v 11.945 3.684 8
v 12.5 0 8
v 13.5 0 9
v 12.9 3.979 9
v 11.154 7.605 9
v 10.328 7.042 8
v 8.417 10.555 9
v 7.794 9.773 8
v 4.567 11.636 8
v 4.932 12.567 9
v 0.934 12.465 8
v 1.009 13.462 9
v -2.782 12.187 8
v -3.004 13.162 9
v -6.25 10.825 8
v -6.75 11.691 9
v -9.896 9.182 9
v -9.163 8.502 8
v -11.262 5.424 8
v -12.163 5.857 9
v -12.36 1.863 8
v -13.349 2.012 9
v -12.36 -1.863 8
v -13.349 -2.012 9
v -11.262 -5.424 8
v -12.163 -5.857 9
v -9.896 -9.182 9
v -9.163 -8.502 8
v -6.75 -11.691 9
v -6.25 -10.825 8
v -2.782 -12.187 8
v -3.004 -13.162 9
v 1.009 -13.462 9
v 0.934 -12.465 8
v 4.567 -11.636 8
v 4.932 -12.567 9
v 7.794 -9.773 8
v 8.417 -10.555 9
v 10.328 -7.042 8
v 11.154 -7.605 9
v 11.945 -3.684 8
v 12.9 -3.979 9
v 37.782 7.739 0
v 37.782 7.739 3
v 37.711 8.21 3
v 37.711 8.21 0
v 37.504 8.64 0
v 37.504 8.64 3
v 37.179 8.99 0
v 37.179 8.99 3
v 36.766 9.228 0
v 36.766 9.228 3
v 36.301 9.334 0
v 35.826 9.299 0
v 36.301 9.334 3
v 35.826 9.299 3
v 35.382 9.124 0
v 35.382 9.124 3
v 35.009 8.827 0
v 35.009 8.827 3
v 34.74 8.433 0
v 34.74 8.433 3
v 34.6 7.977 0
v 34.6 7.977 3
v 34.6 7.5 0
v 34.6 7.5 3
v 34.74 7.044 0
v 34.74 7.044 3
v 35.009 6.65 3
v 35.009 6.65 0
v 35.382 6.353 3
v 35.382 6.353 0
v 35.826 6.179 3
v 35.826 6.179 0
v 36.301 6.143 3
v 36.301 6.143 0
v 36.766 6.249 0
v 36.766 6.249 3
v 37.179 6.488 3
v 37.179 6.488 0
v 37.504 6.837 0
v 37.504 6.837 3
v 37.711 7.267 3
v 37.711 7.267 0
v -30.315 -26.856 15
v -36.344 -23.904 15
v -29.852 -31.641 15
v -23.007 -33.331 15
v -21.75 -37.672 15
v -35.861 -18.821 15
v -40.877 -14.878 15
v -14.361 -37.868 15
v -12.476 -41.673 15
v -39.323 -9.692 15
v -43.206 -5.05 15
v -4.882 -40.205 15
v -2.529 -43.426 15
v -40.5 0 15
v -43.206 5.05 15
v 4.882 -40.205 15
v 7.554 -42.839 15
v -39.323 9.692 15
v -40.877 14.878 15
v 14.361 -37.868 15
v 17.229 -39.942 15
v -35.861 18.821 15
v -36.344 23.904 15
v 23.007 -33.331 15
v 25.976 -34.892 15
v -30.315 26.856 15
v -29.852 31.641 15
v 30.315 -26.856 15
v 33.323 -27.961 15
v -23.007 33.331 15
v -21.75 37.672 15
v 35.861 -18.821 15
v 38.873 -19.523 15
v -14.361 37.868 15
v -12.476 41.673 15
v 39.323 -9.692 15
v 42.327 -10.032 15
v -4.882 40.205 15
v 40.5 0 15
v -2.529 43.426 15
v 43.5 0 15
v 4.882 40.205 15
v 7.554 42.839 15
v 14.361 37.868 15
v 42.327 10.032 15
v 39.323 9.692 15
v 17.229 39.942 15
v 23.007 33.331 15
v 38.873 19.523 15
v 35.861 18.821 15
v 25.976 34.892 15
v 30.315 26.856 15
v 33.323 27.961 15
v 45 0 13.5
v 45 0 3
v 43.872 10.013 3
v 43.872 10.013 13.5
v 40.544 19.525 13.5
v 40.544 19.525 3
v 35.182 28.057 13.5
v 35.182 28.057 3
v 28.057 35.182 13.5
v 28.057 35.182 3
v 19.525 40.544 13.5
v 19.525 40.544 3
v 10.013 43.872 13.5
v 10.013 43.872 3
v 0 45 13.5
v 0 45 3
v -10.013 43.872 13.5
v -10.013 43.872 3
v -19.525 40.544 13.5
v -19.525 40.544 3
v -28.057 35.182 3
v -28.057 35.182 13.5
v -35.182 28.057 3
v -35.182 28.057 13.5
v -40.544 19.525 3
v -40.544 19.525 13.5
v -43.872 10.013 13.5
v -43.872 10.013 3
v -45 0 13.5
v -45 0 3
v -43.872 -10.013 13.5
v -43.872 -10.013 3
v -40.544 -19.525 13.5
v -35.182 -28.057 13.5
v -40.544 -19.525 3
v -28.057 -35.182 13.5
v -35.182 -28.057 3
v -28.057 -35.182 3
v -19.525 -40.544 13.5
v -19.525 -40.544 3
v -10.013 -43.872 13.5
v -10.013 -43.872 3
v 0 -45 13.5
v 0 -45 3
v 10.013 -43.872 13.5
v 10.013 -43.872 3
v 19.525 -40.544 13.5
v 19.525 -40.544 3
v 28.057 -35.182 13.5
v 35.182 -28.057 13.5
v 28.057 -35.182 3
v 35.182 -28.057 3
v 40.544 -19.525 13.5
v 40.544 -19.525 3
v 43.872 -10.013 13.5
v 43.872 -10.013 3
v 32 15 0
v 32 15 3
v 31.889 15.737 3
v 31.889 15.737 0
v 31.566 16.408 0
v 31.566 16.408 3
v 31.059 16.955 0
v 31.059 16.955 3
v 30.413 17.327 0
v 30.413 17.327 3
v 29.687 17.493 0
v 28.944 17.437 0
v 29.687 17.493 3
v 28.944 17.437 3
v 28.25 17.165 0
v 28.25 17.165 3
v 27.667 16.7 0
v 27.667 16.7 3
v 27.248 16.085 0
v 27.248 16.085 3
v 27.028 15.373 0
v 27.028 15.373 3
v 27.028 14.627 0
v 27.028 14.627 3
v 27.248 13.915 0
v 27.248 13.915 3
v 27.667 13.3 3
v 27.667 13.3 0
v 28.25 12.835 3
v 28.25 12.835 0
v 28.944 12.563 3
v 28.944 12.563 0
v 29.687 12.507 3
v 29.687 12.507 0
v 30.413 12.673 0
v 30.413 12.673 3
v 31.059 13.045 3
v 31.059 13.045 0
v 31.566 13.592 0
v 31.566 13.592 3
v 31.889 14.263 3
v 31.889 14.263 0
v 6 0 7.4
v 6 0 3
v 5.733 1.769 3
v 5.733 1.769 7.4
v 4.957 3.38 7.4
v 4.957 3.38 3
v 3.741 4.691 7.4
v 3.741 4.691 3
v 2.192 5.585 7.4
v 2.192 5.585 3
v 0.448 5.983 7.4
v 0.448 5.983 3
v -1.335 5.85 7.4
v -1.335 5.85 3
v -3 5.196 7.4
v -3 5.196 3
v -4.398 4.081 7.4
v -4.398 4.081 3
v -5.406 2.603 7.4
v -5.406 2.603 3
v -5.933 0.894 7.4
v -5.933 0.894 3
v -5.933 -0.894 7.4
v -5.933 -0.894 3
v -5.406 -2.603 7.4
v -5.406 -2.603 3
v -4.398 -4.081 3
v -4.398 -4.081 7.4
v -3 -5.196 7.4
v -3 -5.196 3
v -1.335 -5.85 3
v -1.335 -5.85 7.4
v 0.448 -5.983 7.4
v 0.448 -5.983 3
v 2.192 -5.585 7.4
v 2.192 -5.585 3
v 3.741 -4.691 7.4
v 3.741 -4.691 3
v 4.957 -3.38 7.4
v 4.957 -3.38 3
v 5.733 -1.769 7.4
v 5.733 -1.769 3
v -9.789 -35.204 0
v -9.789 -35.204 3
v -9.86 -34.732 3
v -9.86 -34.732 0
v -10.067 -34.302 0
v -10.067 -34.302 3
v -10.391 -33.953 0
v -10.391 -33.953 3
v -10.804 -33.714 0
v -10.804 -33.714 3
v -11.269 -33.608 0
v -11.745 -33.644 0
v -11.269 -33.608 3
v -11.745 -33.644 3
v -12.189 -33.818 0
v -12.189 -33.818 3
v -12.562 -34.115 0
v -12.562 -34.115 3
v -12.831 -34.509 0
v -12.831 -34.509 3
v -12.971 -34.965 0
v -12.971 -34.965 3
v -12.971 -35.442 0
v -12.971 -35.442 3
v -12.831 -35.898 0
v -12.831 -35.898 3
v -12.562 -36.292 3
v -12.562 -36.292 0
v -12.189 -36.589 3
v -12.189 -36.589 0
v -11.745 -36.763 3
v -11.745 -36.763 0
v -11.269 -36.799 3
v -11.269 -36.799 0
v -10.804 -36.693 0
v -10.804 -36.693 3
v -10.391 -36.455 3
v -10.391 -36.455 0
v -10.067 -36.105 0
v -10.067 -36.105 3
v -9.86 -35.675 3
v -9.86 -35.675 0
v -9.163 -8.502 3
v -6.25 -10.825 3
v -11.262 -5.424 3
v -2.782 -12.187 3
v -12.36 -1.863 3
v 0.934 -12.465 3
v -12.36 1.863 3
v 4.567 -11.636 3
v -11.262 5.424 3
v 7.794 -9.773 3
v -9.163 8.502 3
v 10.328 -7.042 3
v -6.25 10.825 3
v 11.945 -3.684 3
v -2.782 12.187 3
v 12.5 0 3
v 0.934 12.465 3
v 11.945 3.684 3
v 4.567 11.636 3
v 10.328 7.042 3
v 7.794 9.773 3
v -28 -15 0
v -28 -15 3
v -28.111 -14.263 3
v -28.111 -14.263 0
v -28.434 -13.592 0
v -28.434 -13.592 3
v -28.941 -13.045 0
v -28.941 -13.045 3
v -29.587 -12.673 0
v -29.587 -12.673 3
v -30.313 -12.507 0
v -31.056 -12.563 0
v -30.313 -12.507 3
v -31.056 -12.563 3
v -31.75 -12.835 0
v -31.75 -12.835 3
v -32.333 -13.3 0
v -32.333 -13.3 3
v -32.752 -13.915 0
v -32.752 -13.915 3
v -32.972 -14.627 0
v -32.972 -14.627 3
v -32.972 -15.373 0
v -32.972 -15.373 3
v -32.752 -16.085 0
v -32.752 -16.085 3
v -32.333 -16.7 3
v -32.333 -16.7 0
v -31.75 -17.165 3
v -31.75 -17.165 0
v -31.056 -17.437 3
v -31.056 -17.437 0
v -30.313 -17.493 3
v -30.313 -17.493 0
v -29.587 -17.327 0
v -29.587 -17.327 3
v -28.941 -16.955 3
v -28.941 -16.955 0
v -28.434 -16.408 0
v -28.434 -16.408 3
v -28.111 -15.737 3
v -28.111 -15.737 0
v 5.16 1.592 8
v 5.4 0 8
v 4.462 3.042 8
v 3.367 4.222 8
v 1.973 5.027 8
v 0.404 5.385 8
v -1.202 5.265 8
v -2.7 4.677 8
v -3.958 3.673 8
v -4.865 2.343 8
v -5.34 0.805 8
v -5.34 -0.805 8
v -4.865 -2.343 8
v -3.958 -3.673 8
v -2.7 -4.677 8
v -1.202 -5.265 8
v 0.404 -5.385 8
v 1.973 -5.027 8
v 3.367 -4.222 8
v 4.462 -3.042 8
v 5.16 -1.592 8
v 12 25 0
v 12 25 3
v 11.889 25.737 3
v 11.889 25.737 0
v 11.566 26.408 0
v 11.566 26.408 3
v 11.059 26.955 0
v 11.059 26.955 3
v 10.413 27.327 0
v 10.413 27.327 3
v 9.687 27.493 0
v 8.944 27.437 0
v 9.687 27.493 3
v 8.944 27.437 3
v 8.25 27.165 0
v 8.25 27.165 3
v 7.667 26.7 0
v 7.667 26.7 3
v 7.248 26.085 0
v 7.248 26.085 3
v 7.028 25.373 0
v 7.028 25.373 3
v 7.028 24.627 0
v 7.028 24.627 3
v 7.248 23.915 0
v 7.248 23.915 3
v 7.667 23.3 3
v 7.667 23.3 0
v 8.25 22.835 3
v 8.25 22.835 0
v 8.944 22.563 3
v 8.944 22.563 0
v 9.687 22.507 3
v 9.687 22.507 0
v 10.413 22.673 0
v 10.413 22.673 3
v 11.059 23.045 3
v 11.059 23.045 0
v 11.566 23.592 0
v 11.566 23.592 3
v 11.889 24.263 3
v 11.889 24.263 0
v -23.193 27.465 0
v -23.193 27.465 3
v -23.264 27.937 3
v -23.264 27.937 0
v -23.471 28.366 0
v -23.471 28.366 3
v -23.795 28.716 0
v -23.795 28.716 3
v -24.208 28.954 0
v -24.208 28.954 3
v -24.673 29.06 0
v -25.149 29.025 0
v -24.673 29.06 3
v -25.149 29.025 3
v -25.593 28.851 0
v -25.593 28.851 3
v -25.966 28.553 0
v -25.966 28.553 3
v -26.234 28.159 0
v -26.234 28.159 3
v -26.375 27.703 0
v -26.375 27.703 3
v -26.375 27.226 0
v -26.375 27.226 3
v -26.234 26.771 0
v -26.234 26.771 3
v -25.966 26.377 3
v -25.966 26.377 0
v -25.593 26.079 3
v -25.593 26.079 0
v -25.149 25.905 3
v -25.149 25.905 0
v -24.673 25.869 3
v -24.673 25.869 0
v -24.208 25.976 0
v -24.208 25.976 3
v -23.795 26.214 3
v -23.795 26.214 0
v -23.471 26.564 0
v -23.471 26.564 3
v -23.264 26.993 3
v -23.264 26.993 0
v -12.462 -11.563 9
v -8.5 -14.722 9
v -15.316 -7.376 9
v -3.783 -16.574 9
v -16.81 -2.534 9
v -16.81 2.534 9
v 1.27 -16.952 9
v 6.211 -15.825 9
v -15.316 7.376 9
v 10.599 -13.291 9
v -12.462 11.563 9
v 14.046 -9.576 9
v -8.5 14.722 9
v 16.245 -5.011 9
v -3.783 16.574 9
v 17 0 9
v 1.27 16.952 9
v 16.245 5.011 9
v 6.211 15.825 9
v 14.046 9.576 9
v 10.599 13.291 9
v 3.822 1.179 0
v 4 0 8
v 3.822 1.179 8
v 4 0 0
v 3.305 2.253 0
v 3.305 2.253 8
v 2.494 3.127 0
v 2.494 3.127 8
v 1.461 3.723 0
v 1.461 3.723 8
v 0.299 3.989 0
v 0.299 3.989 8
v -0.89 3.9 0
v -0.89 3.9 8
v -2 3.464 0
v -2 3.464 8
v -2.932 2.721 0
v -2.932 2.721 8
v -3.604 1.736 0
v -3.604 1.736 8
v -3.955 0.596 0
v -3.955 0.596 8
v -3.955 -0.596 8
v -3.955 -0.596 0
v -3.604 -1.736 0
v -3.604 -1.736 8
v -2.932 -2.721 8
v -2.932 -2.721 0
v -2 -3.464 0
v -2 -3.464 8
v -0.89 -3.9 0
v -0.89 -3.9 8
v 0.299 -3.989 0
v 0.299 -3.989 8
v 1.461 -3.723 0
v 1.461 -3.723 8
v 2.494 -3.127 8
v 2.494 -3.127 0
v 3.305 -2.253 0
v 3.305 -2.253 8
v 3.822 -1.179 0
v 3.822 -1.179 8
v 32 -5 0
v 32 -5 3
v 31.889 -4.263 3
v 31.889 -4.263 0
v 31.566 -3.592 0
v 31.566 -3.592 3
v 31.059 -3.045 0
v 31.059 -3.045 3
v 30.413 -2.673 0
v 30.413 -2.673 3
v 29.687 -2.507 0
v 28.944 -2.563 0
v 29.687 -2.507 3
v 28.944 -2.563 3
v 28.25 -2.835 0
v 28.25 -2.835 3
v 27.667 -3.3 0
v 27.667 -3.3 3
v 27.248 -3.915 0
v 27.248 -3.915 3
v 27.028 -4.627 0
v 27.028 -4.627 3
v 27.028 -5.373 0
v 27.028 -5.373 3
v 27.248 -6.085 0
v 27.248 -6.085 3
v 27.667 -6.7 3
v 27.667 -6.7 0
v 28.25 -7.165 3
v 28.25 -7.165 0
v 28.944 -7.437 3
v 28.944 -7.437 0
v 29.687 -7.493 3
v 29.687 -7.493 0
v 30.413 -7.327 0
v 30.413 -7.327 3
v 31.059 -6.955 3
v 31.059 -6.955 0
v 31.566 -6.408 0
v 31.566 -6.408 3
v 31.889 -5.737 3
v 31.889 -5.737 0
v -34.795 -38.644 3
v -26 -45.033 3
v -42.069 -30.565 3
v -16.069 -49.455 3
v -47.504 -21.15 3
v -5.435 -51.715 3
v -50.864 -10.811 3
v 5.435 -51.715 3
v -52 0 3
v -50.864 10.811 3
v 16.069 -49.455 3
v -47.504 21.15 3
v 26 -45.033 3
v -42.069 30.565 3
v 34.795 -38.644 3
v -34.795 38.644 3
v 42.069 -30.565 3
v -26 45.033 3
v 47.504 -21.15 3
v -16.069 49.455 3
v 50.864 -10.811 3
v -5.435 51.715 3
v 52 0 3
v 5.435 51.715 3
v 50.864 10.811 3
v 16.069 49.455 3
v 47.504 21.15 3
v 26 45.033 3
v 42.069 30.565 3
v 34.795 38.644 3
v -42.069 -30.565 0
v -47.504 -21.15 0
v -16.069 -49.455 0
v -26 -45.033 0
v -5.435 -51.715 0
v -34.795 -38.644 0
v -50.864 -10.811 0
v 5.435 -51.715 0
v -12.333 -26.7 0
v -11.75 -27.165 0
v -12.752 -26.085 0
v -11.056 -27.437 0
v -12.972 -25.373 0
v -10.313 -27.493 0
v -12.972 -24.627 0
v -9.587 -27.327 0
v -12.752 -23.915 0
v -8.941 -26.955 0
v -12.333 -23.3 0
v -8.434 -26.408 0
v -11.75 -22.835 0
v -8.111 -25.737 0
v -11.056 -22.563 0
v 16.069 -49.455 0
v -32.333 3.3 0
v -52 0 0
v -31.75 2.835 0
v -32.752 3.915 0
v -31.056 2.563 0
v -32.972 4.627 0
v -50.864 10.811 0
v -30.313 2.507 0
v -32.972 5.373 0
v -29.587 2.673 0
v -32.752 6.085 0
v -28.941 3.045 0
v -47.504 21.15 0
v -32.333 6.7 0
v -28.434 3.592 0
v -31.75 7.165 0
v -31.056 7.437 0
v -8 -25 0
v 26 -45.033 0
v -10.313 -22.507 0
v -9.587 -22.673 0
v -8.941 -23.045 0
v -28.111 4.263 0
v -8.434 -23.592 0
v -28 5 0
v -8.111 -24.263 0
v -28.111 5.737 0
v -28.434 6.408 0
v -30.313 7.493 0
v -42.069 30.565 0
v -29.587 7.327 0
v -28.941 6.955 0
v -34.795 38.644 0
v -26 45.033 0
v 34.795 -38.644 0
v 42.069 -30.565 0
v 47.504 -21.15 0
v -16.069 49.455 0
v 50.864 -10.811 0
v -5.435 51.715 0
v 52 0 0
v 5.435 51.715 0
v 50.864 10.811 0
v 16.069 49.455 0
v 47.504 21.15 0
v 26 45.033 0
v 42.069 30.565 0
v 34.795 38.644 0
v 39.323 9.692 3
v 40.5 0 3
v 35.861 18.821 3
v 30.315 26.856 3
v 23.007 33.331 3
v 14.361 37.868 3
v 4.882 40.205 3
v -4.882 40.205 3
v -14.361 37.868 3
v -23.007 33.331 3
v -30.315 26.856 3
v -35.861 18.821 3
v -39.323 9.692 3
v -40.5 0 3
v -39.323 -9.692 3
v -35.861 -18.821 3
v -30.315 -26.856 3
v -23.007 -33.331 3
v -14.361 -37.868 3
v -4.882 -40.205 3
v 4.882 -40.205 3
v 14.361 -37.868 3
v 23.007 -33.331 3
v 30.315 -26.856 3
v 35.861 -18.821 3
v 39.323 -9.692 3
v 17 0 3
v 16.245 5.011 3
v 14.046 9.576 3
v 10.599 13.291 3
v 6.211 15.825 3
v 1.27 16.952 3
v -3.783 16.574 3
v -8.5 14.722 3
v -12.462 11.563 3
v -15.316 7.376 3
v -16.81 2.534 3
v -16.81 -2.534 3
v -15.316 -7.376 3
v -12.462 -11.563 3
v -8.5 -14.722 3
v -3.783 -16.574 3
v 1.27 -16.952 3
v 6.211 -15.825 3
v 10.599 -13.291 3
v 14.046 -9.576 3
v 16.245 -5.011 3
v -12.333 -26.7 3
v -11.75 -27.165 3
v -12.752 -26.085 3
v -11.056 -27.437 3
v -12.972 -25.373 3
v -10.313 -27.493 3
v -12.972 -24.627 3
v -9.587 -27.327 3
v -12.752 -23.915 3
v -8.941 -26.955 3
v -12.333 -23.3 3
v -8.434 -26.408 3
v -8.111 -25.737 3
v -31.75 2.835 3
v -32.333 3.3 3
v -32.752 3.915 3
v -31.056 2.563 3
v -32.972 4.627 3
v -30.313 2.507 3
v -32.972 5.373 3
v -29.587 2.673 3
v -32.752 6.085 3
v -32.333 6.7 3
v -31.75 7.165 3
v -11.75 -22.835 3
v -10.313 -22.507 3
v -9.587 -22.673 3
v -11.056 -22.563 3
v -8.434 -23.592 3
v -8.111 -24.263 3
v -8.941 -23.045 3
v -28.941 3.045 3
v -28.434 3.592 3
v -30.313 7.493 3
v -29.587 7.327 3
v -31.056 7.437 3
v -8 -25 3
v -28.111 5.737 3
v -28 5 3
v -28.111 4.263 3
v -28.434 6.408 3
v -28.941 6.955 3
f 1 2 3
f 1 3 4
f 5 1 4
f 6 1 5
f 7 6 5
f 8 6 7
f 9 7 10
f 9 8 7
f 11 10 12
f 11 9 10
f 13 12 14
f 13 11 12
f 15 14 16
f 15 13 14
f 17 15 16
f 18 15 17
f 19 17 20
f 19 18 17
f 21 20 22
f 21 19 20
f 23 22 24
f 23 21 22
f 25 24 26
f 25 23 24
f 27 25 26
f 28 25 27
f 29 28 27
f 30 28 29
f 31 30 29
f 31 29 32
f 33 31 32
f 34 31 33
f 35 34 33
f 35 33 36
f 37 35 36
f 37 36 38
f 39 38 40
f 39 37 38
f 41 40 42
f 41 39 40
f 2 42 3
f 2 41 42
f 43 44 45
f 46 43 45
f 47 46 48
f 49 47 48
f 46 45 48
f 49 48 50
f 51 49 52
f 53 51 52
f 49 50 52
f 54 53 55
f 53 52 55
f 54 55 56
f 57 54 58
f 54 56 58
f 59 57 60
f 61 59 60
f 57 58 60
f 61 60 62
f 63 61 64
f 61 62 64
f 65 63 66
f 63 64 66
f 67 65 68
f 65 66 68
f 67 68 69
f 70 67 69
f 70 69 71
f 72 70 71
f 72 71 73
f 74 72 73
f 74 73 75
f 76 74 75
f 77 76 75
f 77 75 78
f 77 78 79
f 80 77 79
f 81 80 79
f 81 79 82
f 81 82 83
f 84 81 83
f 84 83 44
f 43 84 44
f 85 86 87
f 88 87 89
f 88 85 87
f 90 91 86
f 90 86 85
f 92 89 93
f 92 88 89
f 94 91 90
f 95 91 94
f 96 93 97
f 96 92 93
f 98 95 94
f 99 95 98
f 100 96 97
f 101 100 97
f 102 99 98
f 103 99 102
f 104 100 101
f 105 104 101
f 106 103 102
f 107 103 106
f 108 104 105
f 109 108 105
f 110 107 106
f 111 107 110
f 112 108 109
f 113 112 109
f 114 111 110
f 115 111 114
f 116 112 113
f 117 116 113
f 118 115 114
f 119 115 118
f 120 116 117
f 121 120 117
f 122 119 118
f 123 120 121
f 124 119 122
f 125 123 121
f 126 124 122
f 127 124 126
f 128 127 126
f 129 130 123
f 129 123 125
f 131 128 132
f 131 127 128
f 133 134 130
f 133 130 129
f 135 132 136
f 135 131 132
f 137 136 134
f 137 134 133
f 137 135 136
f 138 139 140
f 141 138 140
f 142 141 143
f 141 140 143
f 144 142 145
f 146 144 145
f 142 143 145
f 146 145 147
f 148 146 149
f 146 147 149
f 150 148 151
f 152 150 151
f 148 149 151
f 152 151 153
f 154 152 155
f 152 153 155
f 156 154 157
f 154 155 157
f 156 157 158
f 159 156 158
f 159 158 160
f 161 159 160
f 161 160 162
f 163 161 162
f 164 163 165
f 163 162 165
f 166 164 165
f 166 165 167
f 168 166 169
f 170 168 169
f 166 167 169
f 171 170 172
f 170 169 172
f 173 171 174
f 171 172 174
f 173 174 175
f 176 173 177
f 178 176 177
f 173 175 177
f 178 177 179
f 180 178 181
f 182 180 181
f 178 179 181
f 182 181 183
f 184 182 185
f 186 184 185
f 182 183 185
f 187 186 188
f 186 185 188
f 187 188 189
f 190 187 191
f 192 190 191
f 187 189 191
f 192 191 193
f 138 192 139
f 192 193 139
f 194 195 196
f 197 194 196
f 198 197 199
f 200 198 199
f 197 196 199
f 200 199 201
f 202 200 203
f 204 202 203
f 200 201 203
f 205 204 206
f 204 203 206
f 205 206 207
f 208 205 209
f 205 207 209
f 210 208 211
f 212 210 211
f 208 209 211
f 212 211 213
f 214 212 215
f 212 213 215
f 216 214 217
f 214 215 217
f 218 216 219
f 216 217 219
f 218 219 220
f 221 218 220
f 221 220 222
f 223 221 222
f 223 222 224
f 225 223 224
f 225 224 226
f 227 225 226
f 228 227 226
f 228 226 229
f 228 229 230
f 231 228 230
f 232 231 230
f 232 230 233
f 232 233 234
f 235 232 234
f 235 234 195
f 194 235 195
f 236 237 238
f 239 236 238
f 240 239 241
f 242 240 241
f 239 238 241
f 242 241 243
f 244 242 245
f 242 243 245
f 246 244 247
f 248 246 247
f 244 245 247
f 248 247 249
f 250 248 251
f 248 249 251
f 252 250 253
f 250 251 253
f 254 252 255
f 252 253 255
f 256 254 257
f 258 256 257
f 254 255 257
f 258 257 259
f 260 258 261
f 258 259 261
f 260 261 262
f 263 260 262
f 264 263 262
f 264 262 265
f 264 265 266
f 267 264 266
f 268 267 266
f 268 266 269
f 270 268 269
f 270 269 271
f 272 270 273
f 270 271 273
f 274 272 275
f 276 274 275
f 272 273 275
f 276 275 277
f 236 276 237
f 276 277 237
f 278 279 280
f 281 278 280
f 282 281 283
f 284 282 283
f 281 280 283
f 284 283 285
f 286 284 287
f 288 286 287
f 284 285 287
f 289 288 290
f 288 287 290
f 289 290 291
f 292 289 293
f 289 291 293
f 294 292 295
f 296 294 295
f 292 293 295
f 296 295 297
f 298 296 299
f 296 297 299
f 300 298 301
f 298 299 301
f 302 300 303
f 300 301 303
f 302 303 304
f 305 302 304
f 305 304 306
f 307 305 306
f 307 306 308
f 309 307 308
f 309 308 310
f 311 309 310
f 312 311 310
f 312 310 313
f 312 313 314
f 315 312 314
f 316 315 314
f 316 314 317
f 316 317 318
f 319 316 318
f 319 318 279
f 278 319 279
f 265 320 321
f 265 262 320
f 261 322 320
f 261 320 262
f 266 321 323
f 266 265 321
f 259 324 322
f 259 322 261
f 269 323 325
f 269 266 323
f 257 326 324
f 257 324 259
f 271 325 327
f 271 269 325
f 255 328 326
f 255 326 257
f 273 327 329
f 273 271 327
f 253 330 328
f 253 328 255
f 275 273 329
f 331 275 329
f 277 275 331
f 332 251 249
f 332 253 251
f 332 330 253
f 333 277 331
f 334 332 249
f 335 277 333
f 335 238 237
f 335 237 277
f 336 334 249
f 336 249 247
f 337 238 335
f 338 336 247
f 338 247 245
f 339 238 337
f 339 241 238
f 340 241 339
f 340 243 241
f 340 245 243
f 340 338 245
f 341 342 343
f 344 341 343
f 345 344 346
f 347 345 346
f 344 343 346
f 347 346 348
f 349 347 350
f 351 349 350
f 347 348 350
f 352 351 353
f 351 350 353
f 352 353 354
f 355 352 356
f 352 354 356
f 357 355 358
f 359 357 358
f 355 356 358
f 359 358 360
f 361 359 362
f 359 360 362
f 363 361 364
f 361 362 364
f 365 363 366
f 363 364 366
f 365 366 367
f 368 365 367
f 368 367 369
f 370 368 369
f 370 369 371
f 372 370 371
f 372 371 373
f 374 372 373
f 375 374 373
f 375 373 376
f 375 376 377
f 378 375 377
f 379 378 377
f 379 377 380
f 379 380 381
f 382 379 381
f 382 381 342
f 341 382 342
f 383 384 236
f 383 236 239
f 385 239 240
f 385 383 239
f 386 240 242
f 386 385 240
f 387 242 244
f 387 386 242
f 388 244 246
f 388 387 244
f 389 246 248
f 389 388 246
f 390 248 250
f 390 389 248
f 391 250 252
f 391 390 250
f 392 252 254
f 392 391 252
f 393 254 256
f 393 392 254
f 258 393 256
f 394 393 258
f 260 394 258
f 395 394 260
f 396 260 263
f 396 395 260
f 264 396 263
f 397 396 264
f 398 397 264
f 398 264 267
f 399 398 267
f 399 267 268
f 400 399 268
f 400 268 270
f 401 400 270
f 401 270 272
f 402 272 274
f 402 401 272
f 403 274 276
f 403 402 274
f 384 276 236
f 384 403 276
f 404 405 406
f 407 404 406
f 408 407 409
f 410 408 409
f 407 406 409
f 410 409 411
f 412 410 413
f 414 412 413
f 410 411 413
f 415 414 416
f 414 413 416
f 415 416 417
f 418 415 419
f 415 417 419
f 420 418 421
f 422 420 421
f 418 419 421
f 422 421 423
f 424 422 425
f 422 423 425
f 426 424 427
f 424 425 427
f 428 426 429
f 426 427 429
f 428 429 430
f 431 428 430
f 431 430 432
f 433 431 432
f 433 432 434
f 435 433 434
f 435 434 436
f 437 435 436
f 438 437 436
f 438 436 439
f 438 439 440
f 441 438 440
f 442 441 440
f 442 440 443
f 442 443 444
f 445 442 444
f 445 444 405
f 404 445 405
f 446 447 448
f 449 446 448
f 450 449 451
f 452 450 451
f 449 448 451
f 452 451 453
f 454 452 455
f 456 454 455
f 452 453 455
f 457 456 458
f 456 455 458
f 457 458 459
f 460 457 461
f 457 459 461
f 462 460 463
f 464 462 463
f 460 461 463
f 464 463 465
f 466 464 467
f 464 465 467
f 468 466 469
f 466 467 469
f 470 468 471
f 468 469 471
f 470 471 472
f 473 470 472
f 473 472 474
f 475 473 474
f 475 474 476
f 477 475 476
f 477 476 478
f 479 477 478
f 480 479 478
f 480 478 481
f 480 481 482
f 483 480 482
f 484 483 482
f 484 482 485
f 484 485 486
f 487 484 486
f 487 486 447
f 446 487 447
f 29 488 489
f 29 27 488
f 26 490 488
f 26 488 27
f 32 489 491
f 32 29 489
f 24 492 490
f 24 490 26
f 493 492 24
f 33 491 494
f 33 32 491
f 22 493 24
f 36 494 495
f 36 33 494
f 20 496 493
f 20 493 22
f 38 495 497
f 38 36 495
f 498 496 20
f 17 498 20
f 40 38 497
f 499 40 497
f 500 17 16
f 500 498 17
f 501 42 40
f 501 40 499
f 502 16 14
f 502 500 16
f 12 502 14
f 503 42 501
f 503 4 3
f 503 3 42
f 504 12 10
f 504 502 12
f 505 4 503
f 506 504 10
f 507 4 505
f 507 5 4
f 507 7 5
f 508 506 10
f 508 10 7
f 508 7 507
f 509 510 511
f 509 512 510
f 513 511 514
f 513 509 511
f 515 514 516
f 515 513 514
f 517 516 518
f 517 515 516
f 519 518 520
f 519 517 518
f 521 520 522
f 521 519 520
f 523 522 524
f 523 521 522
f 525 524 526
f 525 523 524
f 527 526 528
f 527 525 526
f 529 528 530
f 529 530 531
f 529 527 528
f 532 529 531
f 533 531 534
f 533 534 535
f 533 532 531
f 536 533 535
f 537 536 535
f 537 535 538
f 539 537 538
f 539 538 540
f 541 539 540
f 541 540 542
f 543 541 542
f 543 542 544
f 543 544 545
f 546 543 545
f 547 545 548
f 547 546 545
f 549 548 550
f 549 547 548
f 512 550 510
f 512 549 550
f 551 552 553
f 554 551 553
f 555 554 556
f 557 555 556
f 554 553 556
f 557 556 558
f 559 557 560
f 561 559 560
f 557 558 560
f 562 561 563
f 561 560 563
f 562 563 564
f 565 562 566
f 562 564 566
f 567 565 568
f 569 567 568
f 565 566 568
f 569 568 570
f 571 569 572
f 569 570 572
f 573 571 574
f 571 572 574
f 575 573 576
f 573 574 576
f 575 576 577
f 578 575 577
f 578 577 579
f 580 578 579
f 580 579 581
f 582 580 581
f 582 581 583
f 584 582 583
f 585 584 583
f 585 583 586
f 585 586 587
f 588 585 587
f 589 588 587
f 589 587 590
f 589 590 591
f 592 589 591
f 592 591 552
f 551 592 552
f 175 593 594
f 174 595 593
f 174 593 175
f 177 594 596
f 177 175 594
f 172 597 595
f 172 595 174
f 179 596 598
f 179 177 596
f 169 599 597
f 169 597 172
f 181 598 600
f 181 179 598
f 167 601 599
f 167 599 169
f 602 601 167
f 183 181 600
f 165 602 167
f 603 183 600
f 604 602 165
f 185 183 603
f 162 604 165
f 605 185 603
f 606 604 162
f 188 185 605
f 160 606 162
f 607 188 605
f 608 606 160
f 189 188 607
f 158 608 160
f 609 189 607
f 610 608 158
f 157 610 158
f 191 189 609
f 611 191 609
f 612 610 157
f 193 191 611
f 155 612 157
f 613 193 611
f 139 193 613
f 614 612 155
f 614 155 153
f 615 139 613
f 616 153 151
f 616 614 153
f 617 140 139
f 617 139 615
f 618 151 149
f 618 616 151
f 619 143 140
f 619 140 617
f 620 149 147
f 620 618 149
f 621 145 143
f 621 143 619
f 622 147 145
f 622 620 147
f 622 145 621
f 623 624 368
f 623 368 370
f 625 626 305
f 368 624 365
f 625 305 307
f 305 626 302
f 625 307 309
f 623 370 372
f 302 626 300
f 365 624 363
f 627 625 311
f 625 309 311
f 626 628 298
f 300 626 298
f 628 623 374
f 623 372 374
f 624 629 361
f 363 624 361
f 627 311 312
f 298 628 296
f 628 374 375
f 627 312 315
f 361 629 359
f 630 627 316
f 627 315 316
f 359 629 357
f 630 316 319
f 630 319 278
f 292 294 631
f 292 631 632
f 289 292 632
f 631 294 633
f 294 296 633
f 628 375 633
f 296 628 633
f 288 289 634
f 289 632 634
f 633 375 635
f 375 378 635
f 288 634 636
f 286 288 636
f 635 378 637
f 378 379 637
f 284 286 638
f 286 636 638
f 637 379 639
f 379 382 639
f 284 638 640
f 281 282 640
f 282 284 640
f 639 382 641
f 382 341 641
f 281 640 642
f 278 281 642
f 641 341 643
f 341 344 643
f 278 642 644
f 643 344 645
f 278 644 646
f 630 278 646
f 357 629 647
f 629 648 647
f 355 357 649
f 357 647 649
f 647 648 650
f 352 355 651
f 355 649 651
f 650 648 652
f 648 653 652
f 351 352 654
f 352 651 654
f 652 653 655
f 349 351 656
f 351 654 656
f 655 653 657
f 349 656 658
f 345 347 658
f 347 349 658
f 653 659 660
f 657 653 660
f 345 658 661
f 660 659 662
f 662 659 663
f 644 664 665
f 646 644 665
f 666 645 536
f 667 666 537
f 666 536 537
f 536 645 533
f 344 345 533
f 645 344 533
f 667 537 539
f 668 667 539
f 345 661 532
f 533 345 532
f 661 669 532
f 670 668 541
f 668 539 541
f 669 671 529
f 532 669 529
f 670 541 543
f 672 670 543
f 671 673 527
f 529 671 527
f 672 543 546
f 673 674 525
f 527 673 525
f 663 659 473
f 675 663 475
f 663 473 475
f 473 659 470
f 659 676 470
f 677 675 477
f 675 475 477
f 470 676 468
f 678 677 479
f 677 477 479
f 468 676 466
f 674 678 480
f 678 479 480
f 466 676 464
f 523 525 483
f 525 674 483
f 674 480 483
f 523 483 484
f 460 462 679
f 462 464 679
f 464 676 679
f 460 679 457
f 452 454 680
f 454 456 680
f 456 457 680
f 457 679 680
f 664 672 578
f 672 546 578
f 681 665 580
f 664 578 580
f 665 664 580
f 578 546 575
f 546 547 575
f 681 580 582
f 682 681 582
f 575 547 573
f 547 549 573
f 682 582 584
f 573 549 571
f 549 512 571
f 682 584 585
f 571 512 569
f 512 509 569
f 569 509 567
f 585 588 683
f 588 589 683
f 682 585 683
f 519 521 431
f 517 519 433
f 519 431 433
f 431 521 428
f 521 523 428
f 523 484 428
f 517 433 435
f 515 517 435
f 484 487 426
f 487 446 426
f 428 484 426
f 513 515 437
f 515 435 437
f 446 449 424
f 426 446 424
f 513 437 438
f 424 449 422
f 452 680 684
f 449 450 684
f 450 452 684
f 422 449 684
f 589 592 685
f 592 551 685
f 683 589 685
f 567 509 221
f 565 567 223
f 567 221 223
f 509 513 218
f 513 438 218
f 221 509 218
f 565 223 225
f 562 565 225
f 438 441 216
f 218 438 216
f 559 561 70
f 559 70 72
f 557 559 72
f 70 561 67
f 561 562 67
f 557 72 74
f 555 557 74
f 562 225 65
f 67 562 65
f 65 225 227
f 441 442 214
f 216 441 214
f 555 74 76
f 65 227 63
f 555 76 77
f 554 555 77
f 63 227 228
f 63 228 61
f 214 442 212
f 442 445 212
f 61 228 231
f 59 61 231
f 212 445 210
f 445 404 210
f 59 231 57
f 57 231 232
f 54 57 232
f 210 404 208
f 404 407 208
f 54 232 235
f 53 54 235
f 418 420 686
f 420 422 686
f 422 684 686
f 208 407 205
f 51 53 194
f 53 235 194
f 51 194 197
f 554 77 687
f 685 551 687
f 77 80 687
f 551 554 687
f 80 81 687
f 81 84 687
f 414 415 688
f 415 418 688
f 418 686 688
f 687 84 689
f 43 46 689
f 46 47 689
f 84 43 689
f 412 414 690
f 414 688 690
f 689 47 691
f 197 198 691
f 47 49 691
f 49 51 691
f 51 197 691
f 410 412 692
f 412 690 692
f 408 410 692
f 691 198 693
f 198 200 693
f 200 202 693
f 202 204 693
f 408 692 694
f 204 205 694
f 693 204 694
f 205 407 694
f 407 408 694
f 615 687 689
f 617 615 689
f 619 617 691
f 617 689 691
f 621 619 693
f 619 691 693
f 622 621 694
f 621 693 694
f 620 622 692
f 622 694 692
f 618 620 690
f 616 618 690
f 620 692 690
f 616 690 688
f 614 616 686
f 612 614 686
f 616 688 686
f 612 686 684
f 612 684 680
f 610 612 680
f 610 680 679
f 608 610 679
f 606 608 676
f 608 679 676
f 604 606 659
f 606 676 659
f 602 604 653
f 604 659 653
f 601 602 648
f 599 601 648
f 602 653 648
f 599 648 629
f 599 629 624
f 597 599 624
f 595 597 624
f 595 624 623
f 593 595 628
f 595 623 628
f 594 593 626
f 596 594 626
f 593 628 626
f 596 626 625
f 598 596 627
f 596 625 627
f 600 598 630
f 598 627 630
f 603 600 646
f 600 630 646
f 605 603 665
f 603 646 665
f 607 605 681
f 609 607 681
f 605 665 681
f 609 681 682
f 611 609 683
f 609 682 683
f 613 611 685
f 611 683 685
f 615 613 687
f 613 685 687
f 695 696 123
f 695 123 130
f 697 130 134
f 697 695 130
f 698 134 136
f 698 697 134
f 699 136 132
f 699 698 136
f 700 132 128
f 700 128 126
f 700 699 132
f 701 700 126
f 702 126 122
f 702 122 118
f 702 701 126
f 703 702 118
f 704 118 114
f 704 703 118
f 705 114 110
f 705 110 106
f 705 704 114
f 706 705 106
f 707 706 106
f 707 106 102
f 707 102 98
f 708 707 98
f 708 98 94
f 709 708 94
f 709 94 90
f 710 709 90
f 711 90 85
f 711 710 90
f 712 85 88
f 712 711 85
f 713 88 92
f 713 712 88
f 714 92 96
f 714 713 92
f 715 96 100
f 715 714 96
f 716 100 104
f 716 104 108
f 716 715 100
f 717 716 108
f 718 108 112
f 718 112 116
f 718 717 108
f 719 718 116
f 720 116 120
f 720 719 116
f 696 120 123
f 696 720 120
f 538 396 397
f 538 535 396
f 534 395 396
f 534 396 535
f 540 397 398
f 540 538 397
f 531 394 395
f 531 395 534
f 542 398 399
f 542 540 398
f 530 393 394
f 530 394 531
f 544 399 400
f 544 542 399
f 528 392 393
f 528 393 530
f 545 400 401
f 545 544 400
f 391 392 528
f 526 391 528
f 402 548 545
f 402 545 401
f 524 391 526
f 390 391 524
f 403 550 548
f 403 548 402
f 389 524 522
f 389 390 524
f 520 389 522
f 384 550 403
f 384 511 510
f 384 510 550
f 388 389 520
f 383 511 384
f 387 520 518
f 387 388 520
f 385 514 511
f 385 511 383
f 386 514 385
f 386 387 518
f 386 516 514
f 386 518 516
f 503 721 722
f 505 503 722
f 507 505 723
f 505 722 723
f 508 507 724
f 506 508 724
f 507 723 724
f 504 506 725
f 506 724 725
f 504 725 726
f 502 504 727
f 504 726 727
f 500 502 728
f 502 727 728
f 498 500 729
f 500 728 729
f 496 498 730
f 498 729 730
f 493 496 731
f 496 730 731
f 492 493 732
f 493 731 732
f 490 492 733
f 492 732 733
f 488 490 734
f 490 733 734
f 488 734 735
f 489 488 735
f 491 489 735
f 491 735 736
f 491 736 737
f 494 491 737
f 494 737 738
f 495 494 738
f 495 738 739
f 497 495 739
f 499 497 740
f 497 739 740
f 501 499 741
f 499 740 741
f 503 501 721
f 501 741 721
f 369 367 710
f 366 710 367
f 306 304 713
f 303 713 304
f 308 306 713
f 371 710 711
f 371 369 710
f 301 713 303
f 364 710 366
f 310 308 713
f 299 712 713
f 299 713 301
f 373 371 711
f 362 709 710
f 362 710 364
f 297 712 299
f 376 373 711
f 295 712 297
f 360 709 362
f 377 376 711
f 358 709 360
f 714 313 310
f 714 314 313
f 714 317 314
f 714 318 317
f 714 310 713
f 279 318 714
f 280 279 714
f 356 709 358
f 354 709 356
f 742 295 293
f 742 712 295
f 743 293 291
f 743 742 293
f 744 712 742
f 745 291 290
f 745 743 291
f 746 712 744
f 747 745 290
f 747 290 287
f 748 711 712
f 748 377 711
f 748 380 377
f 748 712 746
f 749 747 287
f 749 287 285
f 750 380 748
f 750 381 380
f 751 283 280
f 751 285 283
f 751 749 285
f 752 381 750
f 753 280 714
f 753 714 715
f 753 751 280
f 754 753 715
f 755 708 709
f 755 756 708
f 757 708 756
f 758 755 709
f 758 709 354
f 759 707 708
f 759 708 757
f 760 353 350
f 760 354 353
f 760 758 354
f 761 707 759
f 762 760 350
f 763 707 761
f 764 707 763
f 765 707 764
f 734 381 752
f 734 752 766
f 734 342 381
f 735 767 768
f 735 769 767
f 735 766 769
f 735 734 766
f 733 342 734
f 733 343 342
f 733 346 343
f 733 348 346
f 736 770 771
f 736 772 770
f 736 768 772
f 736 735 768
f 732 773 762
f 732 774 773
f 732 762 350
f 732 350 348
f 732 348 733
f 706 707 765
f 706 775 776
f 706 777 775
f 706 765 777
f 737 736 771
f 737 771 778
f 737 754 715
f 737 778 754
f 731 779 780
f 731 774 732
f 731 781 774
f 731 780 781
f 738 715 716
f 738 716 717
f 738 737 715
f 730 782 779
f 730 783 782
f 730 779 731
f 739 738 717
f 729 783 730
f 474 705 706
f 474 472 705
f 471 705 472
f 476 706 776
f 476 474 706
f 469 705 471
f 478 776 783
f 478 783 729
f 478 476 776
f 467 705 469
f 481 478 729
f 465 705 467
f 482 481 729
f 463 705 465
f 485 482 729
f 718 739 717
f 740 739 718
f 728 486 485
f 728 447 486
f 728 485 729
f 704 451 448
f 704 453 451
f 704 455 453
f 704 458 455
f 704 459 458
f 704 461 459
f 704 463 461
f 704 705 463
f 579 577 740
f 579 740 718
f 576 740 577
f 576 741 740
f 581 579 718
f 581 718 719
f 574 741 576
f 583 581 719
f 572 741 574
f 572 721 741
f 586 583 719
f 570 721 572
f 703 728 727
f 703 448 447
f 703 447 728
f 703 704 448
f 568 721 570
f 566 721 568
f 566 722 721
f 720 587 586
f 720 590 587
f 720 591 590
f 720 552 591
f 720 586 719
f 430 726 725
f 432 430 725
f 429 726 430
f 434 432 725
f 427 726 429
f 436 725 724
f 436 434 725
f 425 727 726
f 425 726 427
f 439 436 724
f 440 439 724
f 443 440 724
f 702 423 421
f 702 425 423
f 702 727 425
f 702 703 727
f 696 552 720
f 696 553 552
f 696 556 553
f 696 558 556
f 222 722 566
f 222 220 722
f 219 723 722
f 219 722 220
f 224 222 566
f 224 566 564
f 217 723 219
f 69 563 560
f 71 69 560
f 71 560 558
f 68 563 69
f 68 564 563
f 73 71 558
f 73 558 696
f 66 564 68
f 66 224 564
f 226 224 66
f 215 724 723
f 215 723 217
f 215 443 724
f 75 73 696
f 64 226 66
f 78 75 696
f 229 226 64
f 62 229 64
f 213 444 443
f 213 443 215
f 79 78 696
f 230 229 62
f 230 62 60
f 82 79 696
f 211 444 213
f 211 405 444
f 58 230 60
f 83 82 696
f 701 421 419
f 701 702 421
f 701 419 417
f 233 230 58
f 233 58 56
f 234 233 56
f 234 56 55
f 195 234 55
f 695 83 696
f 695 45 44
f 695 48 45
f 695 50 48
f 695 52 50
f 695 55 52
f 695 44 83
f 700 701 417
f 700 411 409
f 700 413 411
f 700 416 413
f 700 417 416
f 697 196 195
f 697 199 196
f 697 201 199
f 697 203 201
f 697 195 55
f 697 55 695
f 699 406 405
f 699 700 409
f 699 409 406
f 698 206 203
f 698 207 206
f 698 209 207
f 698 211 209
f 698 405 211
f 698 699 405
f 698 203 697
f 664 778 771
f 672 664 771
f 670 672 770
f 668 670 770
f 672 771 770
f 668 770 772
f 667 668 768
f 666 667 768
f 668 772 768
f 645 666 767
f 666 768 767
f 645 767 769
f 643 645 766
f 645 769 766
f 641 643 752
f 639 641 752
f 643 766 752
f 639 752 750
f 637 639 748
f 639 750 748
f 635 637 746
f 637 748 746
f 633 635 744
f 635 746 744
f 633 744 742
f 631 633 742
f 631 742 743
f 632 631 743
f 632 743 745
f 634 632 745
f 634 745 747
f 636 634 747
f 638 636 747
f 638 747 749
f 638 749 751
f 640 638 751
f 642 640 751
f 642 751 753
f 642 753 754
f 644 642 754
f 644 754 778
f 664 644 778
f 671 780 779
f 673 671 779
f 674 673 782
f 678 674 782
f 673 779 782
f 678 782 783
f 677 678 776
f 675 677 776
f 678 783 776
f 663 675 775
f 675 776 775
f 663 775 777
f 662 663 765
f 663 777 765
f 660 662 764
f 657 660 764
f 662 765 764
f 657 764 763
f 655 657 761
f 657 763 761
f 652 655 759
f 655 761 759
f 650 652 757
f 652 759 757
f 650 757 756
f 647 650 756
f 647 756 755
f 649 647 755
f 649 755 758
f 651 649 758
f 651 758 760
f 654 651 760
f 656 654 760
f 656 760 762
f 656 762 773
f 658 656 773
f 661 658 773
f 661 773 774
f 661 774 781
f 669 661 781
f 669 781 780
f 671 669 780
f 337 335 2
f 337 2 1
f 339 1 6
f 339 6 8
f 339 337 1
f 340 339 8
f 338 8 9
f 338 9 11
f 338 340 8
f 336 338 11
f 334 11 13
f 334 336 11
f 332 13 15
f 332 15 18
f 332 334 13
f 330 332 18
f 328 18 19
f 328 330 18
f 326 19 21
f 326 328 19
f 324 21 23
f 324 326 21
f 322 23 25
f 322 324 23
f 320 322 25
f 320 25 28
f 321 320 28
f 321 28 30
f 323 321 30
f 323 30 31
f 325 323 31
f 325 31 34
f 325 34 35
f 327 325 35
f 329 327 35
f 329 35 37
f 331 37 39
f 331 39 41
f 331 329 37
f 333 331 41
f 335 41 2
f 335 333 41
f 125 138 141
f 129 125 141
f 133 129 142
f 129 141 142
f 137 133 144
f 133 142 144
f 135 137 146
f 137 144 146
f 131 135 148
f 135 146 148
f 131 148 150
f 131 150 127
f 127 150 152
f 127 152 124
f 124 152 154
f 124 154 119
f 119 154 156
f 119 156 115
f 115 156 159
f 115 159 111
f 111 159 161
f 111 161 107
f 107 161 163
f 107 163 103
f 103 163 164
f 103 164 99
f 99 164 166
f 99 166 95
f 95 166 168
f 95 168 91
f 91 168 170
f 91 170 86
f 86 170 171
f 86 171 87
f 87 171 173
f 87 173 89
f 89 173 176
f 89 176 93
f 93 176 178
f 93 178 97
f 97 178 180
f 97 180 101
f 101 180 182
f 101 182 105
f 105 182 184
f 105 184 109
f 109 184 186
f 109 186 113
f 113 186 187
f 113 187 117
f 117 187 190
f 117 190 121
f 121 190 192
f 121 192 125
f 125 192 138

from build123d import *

# Parameters (mm, degrees)
SKETCH_R        = 52
SKETCH_R_2      = 4
PAD_DEPTH       = 3
SKETCH001_R     = 45
SKETCH001_R_2   = 40.5
PAD001_DEPTH    = 12
SKETCH002_R     = 2.5
POCKET_DEPTH    = 3.001
SKETCH003_R     = 17
SKETCH003_R_2   = 12.5
PAD002_DEPTH    = 6
SKETCH004_R     = 6
SKETCH004_R_2   = 4
PAD003_DEPTH    = 5
CHAMFER_SIZE    = 1.5
CHAMFER001_SIZE = 1
CHAMFER002_SIZE = 0.6
SKETCH005_R     = 1.6
POCKET001_DEPTH = 3.001


with BuildPart() as part:
    # Sketch → Pad (new body)
    with BuildSketch(Plane.XY):
        Circle(SKETCH_R)
        Circle(SKETCH_R_2, mode=Mode.SUBTRACT)
    extrude(amount=PAD_DEPTH)

    # Sketch001 (on Face4 of Pad) → Pad001 (join)
    with BuildSketch(Plane.XY.offset(3)):
        Circle(SKETCH001_R)
        Circle(SKETCH001_R_2, mode=Mode.SUBTRACT)
    extrude(amount=PAD001_DEPTH)

    # Sketch002 (on Face6 of Pad001) → Pocket (cut, through all)
    with BuildSketch(Plane.XY.offset(3)):
        with Locations((-30.5, 5)):
            Circle(SKETCH002_R)
        with Locations((-30.5, -15)):
            Circle(SKETCH002_R)
        with Locations((-10.5, -25)):
            Circle(SKETCH002_R)
        with Locations((9.5, 25)):
            Circle(SKETCH002_R)
        with Locations((29.5, 15)):
            Circle(SKETCH002_R)
        with Locations((29.5, -5)):
            Circle(SKETCH002_R)
    extrude(amount=-POCKET_DEPTH, mode=Mode.SUBTRACT)

    # Sketch003 (on Face12 of Pocket) → Pad002 (join)
    with BuildSketch(Plane.XY.offset(3)):
        Circle(SKETCH003_R)
        Circle(SKETCH003_R_2, mode=Mode.SUBTRACT)
    extrude(amount=PAD002_DEPTH)

    # Sketch004 (on Face13 of Pad002) → Pad003 (join)
    with BuildSketch(Plane.XY.offset(3)):
        Circle(SKETCH004_R)
        Circle(SKETCH004_R_2, mode=Mode.SUBTRACT)
    extrude(amount=PAD003_DEPTH)

    # Chamfer
    chamfer_edges = [part.edges().sort_by_distance(p)[0] for p in [
        (-45, 0, 15),
    ]]
    chamfer(chamfer_edges, length=CHAMFER_SIZE)

    # Chamfer001
    chamfer001_edges = [part.edges().sort_by_distance(p)[0] for p in [
        (-12.5, 0, 9),
    ]]
    chamfer(chamfer001_edges, length=CHAMFER001_SIZE)

    # Chamfer002
    chamfer002_edges = [part.edges().sort_by_distance(p)[0] for p in [
        (-6, 0, 8),
    ]]
    chamfer(chamfer002_edges, length=CHAMFER002_SIZE)

    # Sketch005 (on Face19 of Chamfer002) → Pocket001 (cut, through all)
    with BuildSketch(Plane.XY.offset(3)):
        with Locations((-24.792704, 27.46492)):
            Circle(SKETCH005_R)
        with Locations((36.18167, 7.738652)):
            Circle(SKETCH005_R)
        with Locations((-11.388966, -35.203572)):
            Circle(SKETCH005_R)
    extrude(amount=-POCKET001_DEPTH, mode=Mode.SUBTRACT)


solid = part.part
